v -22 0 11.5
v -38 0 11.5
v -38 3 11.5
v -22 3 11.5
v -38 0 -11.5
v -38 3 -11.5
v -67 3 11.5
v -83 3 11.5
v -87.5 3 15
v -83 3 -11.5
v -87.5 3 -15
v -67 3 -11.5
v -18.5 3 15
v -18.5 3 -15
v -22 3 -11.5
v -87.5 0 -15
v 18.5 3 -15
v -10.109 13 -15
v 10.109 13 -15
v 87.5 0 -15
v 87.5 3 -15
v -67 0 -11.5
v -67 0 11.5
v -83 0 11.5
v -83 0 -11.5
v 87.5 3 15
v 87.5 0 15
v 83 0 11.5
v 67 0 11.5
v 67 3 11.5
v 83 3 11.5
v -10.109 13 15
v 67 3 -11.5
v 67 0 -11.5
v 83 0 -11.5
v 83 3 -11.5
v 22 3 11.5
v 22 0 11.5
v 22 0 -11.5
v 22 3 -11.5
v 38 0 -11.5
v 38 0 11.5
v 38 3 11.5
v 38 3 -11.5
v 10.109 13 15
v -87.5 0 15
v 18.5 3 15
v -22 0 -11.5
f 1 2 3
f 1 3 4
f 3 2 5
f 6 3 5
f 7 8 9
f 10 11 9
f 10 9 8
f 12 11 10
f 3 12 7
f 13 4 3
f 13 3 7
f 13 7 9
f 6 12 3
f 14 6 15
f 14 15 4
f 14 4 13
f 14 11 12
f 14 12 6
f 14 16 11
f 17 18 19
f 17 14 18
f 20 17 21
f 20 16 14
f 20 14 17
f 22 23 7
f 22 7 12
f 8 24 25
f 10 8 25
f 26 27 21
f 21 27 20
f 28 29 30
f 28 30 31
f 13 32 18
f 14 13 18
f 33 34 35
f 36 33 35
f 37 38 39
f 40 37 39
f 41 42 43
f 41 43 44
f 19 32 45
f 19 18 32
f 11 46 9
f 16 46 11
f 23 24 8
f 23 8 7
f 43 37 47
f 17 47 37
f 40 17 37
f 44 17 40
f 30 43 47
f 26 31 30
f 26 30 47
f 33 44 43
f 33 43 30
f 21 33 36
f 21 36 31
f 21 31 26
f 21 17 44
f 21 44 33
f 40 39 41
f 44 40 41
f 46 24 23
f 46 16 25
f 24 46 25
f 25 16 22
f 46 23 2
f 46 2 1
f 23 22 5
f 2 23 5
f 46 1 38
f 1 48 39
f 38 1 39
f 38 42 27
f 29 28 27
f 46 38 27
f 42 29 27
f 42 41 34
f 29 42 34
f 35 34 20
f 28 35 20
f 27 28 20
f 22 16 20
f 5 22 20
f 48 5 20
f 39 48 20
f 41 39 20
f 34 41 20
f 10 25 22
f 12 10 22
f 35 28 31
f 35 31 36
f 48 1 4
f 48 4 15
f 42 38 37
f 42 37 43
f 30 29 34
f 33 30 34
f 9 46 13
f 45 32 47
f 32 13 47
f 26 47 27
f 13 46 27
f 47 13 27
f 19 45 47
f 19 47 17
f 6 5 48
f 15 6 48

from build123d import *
from OCP.BRepFilletAPI import BRepFilletAPI_MakeChamfer

# Parameters (mm, degrees)
CROQUIS1_W              = 175
CROQUIS1_H              = 30
CROQUIS1_W_2            = 16
CROQUIS1_H_2            = 23
SALIENTE_EXTRUIR1_DEPTH = 3
CROQUIS2_W              = 37
CROQUIS2_H              = 30
SALIENTE_EXTRUIR2_DEPTH = 10
CHAFL_N1_SIZE           = 10
CHAFL_N1_SIZE_2         = 8.390996312


with BuildPart() as part:
    # Croquis1 → Saliente-Extruir1 (new body)
    with BuildSketch(Plane(origin=(0, 0, 0), x_dir=(1, 0, 0), z_dir=(0, 1, 0))):
        Rectangle(CROQUIS1_W, CROQUIS1_H)
        with Locations((-75, 0)):
            Rectangle(CROQUIS1_W_2, CROQUIS1_H_2, mode=Mode.SUBTRACT)
        with Locations((30, 0)):
            Rectangle(CROQUIS1_W_2, CROQUIS1_H_2, mode=Mode.SUBTRACT)
        with Locations((-30, 0)):
            Rectangle(CROQUIS1_W_2, CROQUIS1_H_2, mode=Mode.SUBTRACT)
        with Locations((75, 0)):
            Rectangle(CROQUIS1_W_2, CROQUIS1_H_2, mode=Mode.SUBTRACT)
    extrude(amount=SALIENTE_EXTRUIR1_DEPTH)

    # Croquis2 → Saliente-Extruir2 (add)
    with BuildSketch(Plane(origin=(0, 3, 0), x_dir=(1, 0, 0), z_dir=(0, 1, 0))):
        Rectangle(CROQUIS2_W, CROQUIS2_H)
    extrude(amount=SALIENTE_EXTRUIR2_DEPTH)

    # Chaflán1
    chafl_n1_edges_1 = [part.edges().sort_by_distance(p)[0] for p in [
        (18.5, 13, 0),
    ]]
    chafl_n1_side_1 = [part.faces().sort_by_distance(p)[0] for p in [
        (18.5, 12.832180074, 0),
    ]]
    chafl_n1_edges_2 = [part.edges().sort_by_distance(p)[0] for p in [
        (-18.5, 13, 0),
    ]]
    chafl_n1_side_2 = [part.faces().sort_by_distance(p)[0] for p in [
        (-18.5, 12.832180074, 0),
    ]]
    chafl_n1 = BRepFilletAPI_MakeChamfer(part.part.solid().wrapped)
    for e in chafl_n1_edges_1:
        chafl_n1.Add(CHAFL_N1_SIZE - 0.0001, CHAFL_N1_SIZE_2 - 0.0001, e.wrapped, chafl_n1_side_1[0].wrapped)
    for e in chafl_n1_edges_2:
        chafl_n1.Add(CHAFL_N1_SIZE - 0.0001, CHAFL_N1_SIZE_2 - 0.0001, e.wrapped, chafl_n1_side_2[0].wrapped)
    add(Compound.cast(chafl_n1.Shape()), mode=Mode.REPLACE)  # a hair under: the kernel refuses the full size


solid = part.part
